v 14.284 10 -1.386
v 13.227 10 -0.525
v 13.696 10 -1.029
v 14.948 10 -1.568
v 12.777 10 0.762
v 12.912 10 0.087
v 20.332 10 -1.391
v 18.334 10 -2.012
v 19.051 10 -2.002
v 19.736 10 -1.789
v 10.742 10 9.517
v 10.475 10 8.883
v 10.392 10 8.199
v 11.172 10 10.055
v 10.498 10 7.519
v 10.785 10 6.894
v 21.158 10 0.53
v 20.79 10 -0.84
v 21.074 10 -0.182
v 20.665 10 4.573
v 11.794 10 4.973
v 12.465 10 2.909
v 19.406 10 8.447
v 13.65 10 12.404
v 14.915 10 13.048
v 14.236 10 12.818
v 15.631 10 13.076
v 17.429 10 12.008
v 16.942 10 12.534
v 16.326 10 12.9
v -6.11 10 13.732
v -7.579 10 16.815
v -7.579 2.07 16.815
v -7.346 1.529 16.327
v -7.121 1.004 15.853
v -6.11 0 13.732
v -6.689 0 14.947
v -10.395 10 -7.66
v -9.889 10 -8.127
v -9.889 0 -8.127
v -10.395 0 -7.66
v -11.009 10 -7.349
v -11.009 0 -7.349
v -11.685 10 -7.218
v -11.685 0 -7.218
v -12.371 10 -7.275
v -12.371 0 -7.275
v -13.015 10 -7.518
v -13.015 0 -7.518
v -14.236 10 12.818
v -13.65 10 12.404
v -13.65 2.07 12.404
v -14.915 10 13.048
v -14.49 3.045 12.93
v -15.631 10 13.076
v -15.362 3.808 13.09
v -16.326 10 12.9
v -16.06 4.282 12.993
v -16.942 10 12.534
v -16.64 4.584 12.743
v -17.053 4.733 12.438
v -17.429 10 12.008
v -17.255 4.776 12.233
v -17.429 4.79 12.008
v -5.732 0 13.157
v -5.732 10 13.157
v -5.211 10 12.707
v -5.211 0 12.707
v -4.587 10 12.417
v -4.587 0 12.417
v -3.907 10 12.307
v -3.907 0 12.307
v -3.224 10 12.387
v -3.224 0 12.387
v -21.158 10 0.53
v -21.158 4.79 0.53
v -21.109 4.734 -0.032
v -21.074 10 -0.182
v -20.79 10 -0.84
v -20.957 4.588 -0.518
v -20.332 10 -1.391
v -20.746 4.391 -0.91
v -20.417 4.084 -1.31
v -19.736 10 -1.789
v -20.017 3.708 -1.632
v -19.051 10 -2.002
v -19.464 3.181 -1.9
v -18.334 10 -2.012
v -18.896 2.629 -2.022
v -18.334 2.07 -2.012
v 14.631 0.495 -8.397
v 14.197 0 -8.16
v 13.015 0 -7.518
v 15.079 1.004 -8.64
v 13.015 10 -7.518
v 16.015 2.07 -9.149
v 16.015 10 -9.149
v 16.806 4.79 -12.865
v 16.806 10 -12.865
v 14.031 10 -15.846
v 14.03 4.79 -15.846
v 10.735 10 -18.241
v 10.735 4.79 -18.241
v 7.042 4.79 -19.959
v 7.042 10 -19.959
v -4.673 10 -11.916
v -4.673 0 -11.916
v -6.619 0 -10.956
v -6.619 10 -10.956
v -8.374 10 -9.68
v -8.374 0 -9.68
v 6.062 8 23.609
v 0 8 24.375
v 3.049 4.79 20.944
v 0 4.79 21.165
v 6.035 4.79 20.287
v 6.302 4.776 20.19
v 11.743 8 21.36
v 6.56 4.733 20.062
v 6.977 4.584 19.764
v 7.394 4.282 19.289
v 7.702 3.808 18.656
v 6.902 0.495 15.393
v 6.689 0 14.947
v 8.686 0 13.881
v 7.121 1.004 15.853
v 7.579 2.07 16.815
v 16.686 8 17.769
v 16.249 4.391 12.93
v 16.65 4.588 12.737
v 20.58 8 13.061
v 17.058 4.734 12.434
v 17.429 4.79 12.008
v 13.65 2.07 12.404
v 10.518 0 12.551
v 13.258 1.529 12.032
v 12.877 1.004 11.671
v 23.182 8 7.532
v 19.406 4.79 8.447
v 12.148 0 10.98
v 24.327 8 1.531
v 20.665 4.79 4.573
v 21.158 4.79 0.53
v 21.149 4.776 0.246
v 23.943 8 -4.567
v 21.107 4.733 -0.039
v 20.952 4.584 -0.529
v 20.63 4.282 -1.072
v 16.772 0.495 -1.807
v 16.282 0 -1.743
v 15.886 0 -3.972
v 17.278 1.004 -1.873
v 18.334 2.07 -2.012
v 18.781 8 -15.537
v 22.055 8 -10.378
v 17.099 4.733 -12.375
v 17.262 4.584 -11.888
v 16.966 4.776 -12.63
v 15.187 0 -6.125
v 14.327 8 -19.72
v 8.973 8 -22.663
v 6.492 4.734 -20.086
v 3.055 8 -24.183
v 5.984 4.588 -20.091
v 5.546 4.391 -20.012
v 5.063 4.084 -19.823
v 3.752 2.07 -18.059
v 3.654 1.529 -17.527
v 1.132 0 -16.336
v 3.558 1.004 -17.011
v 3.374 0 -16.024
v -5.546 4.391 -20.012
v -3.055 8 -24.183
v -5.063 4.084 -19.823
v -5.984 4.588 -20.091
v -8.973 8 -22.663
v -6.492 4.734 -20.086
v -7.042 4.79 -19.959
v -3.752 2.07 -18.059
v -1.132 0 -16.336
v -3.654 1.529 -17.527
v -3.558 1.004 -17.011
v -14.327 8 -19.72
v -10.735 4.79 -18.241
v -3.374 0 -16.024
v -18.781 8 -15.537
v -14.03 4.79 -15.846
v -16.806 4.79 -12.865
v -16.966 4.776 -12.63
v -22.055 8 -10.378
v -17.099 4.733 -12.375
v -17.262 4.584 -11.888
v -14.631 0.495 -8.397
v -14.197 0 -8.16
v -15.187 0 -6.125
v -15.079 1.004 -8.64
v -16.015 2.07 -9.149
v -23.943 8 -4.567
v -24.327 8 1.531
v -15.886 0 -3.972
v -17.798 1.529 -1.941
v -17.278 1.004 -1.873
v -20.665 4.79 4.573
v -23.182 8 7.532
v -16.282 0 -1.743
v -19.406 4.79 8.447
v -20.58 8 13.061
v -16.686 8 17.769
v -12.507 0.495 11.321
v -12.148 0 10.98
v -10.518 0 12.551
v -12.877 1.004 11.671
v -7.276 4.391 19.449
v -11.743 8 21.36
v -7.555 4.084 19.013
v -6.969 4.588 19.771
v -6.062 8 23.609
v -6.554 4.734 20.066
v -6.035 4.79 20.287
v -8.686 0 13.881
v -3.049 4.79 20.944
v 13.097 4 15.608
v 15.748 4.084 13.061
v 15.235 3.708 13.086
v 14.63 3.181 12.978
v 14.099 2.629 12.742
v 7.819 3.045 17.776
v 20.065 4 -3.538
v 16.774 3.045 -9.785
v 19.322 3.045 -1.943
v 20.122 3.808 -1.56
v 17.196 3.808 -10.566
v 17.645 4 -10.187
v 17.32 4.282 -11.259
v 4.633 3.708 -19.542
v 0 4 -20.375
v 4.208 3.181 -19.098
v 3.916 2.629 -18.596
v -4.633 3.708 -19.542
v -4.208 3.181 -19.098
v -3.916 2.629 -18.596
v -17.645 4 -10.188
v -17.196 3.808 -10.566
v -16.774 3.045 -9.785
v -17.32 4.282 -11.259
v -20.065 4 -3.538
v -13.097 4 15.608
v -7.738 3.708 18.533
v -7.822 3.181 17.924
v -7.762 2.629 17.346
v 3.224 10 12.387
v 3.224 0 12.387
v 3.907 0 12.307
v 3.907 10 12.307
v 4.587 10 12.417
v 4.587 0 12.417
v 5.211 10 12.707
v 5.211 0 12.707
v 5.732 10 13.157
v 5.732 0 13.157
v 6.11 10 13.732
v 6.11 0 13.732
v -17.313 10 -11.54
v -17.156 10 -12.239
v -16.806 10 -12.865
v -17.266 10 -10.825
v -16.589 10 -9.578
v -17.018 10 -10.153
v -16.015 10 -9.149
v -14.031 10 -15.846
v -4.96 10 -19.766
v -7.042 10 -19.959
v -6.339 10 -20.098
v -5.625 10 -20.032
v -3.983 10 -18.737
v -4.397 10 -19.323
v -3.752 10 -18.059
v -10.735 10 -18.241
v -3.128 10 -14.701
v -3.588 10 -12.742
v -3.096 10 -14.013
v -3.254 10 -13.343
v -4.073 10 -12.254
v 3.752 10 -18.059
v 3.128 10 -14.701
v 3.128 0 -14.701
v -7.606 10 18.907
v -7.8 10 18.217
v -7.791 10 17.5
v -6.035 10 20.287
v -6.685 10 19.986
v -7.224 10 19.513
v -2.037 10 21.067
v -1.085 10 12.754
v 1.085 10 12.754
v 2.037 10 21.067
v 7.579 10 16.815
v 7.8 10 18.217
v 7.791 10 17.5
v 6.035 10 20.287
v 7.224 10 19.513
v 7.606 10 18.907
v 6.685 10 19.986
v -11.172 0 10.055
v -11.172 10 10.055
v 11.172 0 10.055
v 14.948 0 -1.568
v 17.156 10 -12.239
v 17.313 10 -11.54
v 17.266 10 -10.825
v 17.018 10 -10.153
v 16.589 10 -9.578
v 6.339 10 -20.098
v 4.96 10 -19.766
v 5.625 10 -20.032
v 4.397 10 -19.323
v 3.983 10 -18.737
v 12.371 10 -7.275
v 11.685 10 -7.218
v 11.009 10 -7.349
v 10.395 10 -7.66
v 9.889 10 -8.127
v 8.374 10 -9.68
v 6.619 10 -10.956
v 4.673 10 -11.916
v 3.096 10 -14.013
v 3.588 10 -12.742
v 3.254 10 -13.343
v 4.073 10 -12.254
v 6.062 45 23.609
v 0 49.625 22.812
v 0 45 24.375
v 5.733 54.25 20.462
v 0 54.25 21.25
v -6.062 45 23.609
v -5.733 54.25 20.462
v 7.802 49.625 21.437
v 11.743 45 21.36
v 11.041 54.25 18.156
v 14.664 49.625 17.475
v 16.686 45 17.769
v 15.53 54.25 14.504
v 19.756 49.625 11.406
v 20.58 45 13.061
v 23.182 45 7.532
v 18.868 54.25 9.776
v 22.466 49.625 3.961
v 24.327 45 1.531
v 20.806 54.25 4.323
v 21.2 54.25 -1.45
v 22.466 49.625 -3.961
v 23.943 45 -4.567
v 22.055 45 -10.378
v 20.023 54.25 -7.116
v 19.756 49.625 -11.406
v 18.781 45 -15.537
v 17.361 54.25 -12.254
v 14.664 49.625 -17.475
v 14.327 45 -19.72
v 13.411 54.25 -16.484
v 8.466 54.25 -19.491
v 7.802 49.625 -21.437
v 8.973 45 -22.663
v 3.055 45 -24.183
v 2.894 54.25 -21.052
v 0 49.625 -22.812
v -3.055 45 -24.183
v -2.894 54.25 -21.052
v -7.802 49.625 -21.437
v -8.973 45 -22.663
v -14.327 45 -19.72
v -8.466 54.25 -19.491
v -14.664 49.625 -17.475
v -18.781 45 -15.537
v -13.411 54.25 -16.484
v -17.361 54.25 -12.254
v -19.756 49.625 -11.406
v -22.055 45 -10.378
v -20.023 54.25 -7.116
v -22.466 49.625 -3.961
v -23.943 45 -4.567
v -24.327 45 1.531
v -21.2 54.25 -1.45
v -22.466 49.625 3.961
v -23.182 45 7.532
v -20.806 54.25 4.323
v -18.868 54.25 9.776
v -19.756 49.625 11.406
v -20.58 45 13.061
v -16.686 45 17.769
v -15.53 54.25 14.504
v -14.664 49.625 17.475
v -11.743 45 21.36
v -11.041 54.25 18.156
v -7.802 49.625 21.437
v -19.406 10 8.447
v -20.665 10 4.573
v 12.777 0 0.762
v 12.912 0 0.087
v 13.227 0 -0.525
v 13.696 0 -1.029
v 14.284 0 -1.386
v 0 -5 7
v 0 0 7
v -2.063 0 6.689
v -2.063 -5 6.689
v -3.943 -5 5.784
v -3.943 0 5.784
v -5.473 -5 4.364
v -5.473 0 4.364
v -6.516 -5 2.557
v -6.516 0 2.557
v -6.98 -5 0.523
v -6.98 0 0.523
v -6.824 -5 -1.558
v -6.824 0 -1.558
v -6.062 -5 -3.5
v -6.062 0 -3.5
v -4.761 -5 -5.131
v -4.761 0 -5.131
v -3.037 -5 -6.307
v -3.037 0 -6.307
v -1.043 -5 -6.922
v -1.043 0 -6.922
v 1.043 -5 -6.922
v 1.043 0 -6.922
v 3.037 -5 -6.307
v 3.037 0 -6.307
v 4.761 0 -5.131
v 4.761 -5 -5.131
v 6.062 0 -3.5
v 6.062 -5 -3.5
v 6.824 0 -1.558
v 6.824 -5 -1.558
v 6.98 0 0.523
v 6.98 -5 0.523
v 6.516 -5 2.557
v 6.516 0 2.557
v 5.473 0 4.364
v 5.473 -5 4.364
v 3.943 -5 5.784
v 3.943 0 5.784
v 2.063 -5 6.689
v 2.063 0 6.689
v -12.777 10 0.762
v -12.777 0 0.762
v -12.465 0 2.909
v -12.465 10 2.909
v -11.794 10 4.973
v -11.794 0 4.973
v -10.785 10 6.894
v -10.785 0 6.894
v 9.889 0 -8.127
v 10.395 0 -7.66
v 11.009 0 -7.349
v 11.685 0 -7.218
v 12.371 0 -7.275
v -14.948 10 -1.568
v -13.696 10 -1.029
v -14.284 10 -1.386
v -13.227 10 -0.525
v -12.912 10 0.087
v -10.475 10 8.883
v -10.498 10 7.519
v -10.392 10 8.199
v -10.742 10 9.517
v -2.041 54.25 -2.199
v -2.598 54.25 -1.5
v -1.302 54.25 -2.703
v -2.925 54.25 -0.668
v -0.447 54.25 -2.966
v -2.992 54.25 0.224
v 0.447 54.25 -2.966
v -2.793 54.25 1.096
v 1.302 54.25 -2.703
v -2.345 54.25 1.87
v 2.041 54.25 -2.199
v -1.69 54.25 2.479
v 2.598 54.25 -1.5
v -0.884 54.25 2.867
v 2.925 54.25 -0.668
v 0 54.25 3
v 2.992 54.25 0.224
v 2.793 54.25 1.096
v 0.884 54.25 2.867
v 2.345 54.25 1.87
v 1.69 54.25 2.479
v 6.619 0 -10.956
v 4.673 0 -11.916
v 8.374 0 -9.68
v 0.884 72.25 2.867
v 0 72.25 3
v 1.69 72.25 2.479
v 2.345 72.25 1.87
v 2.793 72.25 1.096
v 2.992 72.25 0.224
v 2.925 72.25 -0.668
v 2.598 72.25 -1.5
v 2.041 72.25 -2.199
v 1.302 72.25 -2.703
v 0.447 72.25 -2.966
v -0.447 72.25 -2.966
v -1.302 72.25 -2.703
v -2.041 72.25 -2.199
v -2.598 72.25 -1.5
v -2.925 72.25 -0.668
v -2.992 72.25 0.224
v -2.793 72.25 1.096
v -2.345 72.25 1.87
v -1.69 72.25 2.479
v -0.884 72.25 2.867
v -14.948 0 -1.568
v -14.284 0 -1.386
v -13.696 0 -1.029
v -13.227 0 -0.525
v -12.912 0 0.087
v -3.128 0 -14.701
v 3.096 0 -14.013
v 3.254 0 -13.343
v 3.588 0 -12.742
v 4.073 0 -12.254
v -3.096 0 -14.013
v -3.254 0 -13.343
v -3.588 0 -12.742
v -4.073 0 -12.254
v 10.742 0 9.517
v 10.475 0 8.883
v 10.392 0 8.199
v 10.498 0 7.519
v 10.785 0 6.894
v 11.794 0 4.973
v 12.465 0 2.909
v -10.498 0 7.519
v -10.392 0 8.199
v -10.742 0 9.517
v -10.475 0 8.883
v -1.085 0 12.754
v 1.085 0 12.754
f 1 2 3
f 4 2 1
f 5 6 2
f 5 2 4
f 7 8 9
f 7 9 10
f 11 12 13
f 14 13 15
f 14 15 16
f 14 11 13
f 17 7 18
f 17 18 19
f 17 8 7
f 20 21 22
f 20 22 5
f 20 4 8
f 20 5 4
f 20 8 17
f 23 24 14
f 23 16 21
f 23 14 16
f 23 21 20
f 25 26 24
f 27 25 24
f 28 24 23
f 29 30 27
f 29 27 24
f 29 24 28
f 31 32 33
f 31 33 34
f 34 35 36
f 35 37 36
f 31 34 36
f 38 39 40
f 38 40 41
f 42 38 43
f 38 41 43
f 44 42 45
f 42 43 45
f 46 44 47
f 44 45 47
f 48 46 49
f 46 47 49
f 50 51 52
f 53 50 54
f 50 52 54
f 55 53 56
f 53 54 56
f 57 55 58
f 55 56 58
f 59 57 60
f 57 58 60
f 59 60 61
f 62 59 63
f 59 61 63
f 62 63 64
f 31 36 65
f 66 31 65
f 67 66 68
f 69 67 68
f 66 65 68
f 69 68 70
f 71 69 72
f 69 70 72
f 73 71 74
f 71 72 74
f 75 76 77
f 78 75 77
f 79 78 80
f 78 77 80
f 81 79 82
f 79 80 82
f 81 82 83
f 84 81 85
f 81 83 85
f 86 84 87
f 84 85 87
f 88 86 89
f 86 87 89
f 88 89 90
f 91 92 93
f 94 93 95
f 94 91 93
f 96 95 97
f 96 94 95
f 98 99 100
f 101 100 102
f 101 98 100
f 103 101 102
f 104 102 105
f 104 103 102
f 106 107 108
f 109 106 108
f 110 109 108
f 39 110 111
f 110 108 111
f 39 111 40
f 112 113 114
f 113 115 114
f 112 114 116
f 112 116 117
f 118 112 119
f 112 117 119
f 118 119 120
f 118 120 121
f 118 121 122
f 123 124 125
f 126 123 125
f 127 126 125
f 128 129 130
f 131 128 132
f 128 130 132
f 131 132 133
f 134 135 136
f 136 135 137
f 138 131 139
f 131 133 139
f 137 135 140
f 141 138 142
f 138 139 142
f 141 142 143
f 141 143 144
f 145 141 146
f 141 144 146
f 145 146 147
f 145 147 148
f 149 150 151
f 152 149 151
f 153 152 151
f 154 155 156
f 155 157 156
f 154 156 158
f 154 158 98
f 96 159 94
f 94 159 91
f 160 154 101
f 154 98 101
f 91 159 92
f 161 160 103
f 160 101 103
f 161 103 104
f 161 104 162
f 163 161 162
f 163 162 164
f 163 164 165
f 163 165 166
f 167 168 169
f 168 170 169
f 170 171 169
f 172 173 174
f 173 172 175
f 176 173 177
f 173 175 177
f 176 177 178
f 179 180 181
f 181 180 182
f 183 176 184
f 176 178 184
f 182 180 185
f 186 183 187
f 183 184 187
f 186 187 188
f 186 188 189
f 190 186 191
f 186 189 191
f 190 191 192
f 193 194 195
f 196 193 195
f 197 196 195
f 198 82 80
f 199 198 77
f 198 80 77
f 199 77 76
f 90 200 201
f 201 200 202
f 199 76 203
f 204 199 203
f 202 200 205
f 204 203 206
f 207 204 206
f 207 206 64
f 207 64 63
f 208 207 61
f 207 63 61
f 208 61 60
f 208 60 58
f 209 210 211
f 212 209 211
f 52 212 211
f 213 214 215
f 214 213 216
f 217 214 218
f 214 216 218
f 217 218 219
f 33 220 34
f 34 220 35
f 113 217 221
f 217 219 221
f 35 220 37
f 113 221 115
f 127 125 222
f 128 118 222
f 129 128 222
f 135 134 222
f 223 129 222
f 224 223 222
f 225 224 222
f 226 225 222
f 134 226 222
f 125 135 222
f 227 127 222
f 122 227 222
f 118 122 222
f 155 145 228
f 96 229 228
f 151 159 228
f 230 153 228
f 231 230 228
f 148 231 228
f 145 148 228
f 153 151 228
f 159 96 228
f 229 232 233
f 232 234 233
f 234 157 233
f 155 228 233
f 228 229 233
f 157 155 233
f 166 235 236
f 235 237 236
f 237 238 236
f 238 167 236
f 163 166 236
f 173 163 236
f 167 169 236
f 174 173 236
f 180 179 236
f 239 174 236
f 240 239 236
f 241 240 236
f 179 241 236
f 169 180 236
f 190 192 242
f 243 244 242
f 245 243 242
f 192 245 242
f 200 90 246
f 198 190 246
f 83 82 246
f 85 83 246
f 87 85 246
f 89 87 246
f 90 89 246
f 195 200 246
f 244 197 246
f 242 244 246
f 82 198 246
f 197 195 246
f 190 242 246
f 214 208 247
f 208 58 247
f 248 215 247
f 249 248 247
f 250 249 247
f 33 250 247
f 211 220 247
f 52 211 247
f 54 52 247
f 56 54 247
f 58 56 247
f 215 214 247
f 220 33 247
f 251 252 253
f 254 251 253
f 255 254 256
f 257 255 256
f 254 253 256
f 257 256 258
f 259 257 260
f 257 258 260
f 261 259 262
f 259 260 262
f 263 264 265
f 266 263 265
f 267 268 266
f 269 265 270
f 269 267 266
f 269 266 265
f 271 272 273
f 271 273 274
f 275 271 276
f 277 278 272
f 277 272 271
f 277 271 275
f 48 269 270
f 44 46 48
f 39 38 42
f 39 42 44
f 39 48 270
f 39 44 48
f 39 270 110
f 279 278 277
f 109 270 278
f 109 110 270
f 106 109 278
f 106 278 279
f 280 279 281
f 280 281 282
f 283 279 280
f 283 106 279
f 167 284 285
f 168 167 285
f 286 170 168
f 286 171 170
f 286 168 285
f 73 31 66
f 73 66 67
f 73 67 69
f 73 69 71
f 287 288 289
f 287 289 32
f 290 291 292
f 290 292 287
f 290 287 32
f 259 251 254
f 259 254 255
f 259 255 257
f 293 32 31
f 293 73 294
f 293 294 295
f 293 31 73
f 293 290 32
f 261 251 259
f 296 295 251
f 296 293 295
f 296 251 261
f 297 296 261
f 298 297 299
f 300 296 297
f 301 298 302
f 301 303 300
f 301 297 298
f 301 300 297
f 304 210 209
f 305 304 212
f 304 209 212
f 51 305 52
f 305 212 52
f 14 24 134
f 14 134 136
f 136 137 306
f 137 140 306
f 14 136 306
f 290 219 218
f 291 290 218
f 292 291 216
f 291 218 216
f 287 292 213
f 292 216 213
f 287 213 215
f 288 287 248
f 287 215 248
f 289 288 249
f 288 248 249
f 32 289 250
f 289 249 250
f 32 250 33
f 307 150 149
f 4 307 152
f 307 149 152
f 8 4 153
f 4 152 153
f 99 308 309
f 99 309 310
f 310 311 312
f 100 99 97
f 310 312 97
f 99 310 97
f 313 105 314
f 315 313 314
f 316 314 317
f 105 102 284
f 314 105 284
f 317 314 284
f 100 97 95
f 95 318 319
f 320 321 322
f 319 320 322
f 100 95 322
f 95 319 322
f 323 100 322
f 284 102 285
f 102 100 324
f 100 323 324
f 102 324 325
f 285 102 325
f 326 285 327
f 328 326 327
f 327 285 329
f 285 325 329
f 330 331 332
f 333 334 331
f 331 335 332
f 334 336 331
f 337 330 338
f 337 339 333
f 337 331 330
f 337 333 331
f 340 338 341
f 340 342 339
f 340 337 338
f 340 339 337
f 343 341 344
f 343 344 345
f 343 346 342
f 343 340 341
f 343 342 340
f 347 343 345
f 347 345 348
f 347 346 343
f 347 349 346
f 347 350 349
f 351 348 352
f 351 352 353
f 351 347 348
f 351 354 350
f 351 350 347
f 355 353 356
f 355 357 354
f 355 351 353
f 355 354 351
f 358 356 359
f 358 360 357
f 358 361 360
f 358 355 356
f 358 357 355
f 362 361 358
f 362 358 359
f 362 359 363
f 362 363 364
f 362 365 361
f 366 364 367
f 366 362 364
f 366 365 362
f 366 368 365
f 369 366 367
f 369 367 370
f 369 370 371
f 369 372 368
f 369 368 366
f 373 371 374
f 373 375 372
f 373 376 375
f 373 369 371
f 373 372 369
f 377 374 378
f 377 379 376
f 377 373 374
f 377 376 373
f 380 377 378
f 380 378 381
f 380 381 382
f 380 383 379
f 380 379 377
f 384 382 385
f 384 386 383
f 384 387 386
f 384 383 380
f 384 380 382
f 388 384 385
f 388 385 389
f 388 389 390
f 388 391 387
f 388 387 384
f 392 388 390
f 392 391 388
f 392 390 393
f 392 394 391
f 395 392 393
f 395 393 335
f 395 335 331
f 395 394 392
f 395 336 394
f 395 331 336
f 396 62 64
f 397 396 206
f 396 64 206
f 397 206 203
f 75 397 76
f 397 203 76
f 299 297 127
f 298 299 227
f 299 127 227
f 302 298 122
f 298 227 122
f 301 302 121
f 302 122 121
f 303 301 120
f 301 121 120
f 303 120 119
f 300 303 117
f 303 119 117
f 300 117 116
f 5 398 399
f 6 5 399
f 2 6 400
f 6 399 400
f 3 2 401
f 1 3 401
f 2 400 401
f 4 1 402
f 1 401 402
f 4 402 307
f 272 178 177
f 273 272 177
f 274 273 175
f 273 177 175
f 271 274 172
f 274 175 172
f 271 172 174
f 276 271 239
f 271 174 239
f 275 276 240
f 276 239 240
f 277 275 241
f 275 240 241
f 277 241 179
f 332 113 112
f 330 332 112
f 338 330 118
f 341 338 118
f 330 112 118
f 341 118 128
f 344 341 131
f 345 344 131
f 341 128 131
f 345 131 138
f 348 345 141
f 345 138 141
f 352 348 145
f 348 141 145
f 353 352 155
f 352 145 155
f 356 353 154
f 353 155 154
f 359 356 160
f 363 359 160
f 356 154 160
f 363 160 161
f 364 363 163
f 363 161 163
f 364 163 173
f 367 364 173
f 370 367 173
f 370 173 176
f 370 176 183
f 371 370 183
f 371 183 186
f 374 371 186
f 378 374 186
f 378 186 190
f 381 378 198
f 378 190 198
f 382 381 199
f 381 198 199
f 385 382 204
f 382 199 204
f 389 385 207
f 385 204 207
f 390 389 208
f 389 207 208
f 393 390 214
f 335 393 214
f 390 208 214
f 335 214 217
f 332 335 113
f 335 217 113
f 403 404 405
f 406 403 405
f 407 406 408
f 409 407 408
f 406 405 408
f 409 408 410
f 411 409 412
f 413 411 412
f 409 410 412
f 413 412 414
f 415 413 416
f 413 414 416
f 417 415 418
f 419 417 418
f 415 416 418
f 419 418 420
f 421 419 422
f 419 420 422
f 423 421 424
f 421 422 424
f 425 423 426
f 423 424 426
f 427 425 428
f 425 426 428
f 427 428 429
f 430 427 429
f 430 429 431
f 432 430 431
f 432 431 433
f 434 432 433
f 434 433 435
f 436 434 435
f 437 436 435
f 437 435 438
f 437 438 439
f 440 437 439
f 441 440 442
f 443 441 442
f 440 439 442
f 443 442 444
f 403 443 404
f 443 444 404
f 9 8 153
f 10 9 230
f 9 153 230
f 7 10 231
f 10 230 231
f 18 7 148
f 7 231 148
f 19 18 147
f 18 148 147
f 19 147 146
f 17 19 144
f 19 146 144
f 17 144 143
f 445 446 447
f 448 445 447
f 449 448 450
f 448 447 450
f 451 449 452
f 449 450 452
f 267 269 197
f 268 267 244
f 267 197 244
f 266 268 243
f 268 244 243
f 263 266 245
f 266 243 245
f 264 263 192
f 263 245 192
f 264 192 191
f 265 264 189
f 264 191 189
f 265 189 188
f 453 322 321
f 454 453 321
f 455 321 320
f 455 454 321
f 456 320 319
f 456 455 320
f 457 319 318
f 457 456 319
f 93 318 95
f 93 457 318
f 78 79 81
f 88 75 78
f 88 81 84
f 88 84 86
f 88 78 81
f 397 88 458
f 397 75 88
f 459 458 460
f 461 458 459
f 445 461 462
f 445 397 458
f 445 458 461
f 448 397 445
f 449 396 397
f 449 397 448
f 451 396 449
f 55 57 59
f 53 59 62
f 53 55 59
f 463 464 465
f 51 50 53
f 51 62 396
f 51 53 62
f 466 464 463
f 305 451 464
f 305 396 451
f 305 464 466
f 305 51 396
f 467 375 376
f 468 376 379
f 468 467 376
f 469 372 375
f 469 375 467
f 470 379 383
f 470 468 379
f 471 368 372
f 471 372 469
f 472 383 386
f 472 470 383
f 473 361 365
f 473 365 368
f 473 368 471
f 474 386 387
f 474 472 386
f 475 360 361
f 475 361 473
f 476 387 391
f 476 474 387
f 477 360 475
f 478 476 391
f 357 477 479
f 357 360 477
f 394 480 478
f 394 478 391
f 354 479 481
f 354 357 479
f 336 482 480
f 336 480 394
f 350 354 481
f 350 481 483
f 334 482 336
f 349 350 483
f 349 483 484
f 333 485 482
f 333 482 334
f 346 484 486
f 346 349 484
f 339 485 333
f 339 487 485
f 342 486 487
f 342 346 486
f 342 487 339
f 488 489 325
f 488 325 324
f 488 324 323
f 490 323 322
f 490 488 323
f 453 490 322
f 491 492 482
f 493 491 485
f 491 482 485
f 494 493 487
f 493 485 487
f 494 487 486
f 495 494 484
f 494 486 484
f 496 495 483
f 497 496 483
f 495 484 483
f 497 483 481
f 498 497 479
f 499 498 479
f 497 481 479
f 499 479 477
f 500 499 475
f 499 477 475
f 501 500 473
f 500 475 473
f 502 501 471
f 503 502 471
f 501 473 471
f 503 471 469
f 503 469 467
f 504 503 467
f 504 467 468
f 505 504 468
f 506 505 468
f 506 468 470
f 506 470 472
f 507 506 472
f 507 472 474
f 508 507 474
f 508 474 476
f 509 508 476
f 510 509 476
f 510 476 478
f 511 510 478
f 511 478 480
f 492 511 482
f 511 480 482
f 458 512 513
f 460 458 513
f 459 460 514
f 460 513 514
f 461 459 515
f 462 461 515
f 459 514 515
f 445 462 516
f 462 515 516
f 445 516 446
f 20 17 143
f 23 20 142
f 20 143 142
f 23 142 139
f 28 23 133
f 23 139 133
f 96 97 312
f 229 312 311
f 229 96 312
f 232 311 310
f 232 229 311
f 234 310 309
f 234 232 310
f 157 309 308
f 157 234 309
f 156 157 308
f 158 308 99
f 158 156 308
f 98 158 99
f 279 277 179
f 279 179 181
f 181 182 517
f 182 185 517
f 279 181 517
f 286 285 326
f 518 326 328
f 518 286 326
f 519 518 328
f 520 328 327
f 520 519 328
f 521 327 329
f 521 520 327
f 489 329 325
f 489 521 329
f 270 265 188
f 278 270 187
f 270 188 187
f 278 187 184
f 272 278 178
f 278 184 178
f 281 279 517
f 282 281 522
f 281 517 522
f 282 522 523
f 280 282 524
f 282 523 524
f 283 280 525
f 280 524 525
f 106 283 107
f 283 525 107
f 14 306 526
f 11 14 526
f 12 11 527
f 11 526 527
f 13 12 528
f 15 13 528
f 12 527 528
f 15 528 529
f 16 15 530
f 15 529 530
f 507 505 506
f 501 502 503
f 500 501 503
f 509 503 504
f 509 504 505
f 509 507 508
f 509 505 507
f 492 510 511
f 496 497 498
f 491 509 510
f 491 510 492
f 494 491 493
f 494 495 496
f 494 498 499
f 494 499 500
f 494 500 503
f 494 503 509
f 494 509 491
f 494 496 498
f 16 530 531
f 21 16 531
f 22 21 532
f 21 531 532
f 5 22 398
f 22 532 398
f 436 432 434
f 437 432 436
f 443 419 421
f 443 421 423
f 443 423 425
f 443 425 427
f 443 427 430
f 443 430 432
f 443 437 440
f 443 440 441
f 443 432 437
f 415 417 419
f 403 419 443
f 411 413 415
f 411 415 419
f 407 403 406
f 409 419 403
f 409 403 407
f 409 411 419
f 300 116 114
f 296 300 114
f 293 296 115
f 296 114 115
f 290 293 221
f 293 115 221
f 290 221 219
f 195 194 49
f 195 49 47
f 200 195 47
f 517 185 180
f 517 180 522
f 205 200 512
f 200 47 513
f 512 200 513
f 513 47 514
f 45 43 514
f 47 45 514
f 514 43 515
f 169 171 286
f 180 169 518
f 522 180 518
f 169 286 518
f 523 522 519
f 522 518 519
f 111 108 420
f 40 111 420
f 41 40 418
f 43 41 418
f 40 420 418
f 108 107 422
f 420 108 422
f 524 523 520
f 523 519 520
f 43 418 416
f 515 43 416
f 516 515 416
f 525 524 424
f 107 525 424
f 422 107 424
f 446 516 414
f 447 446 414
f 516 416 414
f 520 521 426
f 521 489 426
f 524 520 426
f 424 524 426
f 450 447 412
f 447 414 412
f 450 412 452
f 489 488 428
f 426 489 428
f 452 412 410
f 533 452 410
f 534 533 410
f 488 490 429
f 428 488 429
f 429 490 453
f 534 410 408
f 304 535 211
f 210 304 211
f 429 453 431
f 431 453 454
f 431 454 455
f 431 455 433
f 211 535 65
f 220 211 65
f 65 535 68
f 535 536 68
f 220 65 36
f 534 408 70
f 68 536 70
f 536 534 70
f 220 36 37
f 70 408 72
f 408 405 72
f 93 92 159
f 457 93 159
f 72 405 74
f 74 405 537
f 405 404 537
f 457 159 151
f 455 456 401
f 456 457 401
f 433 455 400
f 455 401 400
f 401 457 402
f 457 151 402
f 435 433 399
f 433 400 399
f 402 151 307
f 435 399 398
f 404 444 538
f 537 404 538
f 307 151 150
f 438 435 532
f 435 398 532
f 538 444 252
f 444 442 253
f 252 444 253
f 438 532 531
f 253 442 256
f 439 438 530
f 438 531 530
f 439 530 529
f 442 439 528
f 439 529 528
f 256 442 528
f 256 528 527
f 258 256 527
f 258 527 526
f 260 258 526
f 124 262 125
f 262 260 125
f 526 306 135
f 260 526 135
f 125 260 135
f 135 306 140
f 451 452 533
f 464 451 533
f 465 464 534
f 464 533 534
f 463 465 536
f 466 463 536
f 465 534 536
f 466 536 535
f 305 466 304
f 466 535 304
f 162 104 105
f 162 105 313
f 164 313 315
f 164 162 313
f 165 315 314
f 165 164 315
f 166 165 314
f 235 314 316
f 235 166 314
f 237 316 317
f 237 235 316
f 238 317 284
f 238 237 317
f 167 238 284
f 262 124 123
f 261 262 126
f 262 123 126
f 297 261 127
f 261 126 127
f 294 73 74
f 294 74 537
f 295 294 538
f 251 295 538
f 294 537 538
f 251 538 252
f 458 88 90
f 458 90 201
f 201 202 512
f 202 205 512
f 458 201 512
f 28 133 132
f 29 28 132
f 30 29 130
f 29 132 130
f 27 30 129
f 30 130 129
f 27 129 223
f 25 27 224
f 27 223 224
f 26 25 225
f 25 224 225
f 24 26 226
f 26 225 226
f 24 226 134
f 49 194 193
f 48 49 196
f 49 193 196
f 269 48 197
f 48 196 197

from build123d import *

# Parameters (mm, degrees)
SKETCH1_R           = 24.375
BOSS_EXTRUDE1_DEPTH = 54.25
CHAMFER1_SIZE       = 9.25
CHAMFER1_SIZE2      = 3.125
CHAMFER2_SIZE       = 8
CUT_EXTRUDE1_DEPTH  = 10
SKETCH3_R           = 7
BOSS_EXTRUDE2_DEPTH = 5
SKETCH4_R           = 3
BOSS_EXTRUDE3_DEPTH = 18


with BuildPart() as part:
    # Sketch1 → Boss-Extrude1 (new body)
    with BuildSketch(Plane(origin=(0, 0, 0), x_dir=(1, 0, 0), z_dir=(0, 1, 0))):
        with Locations(Location((0, 0, 0), (0, 0, 270))):
            Circle(SKETCH1_R)
    extrude(amount=BOSS_EXTRUDE1_DEPTH)

    # Chamfer1
    chamfer1_edges = [part.edges().sort_by_distance(p)[0] for p in [
        (0, 54.25, -24.375),
    ]]
    chamfer1_side = [part.faces().sort_by_distance(p)[0] for p in [
        (0, 27.125, -24.375),
    ]]
    chamfer(chamfer1_edges, length=CHAMFER1_SIZE, length2=CHAMFER1_SIZE2, reference=chamfer1_side[0])

    # Chamfer2
    chamfer2_edges = [part.edges().sort_by_distance(p)[0] for p in [
        (0, 0, -24.375),
    ]]
    chamfer(chamfer2_edges, length=CHAMFER2_SIZE)

    # Sketch2 → Cut-Extrude1 (cut)
    with BuildSketch(Plane.XZ):
        with BuildLine():
            Line((-3.752441842, -18.058791036), (-3.127941128, -14.70103845))
            ThreePointArc((-3.127941128, -14.70103845), (-3.399785699, -13.030905705), (-4.673081087, -11.916472345))
            ThreePointArc((-4.673081087, -11.916472345), (-7.523651229, -10.355417528), (-9.889177203, -8.126756686))
            ThreePointArc((-9.889177203, -8.126756686), (-11.342536225, -7.260159658), (-13.014931448, -7.517719508))
            Line((-13.014931448, -7.517719508), (-16.015362591, -9.149257594))
            ThreePointArc((-16.015362591, -9.149257594), (-17.266321132, -10.825132639), (-16.80622135, -12.865172499))
            ThreePointArc((-16.80622135, -12.865172499), (-12.440537552, -17.122930967), (-7.04209813, -19.959223267))
            ThreePointArc((-7.04209813, -19.959223267), (-4.959726276, -19.766397177), (-3.752441842, -18.058791036))
        make_face()
        with BuildLine():
            Line((-18.33449919, -2.011689062), (-14.94810538, -1.568021924))
            ThreePointArc((-14.94810538, -1.568021924), (-13.443719342, -0.793382972), (-12.777300147, 0.761971751))
            ThreePointArc((-12.777300147, 0.761971751), (-12.173523409, 3.955417528), (-10.784928719, 6.893860495))
            ThreePointArc((-10.784928719, 6.893860495), (-10.409858605, 8.543880272), (-11.171611124, 10.054832276))
            Line((-11.171611124, 10.054832276), (-13.650480266, 12.404238871))
            ThreePointArc((-13.650480266, 12.404238871), (-15.630899596, 13.076097273), (-17.428914147, 12.008109392))
            ThreePointArc((-17.428914147, 12.008109392), (-20.129212597, 6.540377643), (-21.158477347, 0.529694131))
            ThreePointArc((-21.158477347, 0.529694131), (-20.331600546, -1.391172651), (-18.33449919, -2.011689062))
        make_face()
        with BuildLine():
            Line((3.752441842, -18.058791036), (3.127941128, -14.70103845))
            ThreePointArc((3.127941128, -14.70103845), (3.399785699, -13.030905705), (4.673081087, -11.916472345))
            ThreePointArc((4.673081087, -11.916472345), (7.523651229, -10.355417528), (9.889177203, -8.126756686))
            ThreePointArc((9.889177203, -8.126756686), (11.342536225, -7.260159658), (13.014931448, -7.517719508))
            Line((13.014931448, -7.517719508), (16.015362591, -9.149257594))
            ThreePointArc((16.015362591, -9.149257594), (17.266321132, -10.825132639), (16.80622135, -12.865172499))
            ThreePointArc((16.80622135, -12.865172499), (12.440537552, -17.122930967), (7.04209813, -19.959223267))
            ThreePointArc((7.04209813, -19.959223267), (4.959726276, -19.766397177), (3.752441842, -18.058791036))
        make_face()
        with BuildLine():
            Line((-7.578901824, 16.815498821), (-6.110496064, 13.731947606))
            ThreePointArc((-6.110496064, 13.731947606), (-4.908889789, 12.540568062), (-3.223724689, 12.387396786))
            ThreePointArc((-3.223724689, 12.387396786), (0, 12.8), (3.223724689, 12.387396786))
            ThreePointArc((3.223724689, 12.387396786), (4.908889789, 12.540568062), (6.110496064, 13.731947606))
            Line((6.110496064, 13.731947606), (7.578901824, 16.815498821))
            ThreePointArc((7.578901824, 16.815498821), (7.605893907, 18.906605194), (6.034560021, 20.286592244))
            ThreePointArc((6.034560021, 20.286592244), (0, 21.16510665), (-6.034560021, 20.286592244))
            ThreePointArc((-6.034560021, 20.286592244), (-7.605893907, 18.906605194), (-7.578901824, 16.815498821))
        make_face()
        with BuildLine():
            Line((13.650480266, 12.404238871), (11.171611124, 10.054832276))
            ThreePointArc((11.171611124, 10.054832276), (10.409858605, 8.543880272), (10.784928719, 6.893860495))
            ThreePointArc((10.784928719, 6.893860495), (12.173523409, 3.955417528), (12.777300147, 0.761971751))
            ThreePointArc((12.777300147, 0.761971751), (13.443719342, -0.793382972), (14.94810538, -1.568021924))
            Line((14.94810538, -1.568021924), (18.33449919, -2.011689062))
            ThreePointArc((18.33449919, -2.011689062), (20.331600546, -1.391172651), (21.158477347, 0.529694131))
            ThreePointArc((21.158477347, 0.529694131), (20.129212597, 6.540377643), (17.428914147, 12.008109392))
            ThreePointArc((17.428914147, 12.008109392), (15.630899596, 13.076097273), (13.650480266, 12.404238871))
        make_face()
    extrude(amount=-CUT_EXTRUDE1_DEPTH, mode=Mode.SUBTRACT)

    # Sketch3 → Boss-Extrude2 (add)
    with BuildSketch(Plane(origin=(0, 0, 0), x_dir=(-1, 0, 0), z_dir=(0, -1, 0))):
        with Locations(Location((0, 0, 0), (0, 0, 270))):
            Circle(SKETCH3_R)
    extrude(amount=BOSS_EXTRUDE2_DEPTH)

    # Sketch4 → Boss-Extrude3 (add)
    with BuildSketch(Plane(origin=(0, 54.25, 0), x_dir=(1, 0, 0), z_dir=(0, 1, 0))):
        with Locations(Location((0, 0, 0), (0, 0, 270))):
            Circle(SKETCH4_R)
    extrude(amount=BOSS_EXTRUDE3_DEPTH)


solid = part.part
